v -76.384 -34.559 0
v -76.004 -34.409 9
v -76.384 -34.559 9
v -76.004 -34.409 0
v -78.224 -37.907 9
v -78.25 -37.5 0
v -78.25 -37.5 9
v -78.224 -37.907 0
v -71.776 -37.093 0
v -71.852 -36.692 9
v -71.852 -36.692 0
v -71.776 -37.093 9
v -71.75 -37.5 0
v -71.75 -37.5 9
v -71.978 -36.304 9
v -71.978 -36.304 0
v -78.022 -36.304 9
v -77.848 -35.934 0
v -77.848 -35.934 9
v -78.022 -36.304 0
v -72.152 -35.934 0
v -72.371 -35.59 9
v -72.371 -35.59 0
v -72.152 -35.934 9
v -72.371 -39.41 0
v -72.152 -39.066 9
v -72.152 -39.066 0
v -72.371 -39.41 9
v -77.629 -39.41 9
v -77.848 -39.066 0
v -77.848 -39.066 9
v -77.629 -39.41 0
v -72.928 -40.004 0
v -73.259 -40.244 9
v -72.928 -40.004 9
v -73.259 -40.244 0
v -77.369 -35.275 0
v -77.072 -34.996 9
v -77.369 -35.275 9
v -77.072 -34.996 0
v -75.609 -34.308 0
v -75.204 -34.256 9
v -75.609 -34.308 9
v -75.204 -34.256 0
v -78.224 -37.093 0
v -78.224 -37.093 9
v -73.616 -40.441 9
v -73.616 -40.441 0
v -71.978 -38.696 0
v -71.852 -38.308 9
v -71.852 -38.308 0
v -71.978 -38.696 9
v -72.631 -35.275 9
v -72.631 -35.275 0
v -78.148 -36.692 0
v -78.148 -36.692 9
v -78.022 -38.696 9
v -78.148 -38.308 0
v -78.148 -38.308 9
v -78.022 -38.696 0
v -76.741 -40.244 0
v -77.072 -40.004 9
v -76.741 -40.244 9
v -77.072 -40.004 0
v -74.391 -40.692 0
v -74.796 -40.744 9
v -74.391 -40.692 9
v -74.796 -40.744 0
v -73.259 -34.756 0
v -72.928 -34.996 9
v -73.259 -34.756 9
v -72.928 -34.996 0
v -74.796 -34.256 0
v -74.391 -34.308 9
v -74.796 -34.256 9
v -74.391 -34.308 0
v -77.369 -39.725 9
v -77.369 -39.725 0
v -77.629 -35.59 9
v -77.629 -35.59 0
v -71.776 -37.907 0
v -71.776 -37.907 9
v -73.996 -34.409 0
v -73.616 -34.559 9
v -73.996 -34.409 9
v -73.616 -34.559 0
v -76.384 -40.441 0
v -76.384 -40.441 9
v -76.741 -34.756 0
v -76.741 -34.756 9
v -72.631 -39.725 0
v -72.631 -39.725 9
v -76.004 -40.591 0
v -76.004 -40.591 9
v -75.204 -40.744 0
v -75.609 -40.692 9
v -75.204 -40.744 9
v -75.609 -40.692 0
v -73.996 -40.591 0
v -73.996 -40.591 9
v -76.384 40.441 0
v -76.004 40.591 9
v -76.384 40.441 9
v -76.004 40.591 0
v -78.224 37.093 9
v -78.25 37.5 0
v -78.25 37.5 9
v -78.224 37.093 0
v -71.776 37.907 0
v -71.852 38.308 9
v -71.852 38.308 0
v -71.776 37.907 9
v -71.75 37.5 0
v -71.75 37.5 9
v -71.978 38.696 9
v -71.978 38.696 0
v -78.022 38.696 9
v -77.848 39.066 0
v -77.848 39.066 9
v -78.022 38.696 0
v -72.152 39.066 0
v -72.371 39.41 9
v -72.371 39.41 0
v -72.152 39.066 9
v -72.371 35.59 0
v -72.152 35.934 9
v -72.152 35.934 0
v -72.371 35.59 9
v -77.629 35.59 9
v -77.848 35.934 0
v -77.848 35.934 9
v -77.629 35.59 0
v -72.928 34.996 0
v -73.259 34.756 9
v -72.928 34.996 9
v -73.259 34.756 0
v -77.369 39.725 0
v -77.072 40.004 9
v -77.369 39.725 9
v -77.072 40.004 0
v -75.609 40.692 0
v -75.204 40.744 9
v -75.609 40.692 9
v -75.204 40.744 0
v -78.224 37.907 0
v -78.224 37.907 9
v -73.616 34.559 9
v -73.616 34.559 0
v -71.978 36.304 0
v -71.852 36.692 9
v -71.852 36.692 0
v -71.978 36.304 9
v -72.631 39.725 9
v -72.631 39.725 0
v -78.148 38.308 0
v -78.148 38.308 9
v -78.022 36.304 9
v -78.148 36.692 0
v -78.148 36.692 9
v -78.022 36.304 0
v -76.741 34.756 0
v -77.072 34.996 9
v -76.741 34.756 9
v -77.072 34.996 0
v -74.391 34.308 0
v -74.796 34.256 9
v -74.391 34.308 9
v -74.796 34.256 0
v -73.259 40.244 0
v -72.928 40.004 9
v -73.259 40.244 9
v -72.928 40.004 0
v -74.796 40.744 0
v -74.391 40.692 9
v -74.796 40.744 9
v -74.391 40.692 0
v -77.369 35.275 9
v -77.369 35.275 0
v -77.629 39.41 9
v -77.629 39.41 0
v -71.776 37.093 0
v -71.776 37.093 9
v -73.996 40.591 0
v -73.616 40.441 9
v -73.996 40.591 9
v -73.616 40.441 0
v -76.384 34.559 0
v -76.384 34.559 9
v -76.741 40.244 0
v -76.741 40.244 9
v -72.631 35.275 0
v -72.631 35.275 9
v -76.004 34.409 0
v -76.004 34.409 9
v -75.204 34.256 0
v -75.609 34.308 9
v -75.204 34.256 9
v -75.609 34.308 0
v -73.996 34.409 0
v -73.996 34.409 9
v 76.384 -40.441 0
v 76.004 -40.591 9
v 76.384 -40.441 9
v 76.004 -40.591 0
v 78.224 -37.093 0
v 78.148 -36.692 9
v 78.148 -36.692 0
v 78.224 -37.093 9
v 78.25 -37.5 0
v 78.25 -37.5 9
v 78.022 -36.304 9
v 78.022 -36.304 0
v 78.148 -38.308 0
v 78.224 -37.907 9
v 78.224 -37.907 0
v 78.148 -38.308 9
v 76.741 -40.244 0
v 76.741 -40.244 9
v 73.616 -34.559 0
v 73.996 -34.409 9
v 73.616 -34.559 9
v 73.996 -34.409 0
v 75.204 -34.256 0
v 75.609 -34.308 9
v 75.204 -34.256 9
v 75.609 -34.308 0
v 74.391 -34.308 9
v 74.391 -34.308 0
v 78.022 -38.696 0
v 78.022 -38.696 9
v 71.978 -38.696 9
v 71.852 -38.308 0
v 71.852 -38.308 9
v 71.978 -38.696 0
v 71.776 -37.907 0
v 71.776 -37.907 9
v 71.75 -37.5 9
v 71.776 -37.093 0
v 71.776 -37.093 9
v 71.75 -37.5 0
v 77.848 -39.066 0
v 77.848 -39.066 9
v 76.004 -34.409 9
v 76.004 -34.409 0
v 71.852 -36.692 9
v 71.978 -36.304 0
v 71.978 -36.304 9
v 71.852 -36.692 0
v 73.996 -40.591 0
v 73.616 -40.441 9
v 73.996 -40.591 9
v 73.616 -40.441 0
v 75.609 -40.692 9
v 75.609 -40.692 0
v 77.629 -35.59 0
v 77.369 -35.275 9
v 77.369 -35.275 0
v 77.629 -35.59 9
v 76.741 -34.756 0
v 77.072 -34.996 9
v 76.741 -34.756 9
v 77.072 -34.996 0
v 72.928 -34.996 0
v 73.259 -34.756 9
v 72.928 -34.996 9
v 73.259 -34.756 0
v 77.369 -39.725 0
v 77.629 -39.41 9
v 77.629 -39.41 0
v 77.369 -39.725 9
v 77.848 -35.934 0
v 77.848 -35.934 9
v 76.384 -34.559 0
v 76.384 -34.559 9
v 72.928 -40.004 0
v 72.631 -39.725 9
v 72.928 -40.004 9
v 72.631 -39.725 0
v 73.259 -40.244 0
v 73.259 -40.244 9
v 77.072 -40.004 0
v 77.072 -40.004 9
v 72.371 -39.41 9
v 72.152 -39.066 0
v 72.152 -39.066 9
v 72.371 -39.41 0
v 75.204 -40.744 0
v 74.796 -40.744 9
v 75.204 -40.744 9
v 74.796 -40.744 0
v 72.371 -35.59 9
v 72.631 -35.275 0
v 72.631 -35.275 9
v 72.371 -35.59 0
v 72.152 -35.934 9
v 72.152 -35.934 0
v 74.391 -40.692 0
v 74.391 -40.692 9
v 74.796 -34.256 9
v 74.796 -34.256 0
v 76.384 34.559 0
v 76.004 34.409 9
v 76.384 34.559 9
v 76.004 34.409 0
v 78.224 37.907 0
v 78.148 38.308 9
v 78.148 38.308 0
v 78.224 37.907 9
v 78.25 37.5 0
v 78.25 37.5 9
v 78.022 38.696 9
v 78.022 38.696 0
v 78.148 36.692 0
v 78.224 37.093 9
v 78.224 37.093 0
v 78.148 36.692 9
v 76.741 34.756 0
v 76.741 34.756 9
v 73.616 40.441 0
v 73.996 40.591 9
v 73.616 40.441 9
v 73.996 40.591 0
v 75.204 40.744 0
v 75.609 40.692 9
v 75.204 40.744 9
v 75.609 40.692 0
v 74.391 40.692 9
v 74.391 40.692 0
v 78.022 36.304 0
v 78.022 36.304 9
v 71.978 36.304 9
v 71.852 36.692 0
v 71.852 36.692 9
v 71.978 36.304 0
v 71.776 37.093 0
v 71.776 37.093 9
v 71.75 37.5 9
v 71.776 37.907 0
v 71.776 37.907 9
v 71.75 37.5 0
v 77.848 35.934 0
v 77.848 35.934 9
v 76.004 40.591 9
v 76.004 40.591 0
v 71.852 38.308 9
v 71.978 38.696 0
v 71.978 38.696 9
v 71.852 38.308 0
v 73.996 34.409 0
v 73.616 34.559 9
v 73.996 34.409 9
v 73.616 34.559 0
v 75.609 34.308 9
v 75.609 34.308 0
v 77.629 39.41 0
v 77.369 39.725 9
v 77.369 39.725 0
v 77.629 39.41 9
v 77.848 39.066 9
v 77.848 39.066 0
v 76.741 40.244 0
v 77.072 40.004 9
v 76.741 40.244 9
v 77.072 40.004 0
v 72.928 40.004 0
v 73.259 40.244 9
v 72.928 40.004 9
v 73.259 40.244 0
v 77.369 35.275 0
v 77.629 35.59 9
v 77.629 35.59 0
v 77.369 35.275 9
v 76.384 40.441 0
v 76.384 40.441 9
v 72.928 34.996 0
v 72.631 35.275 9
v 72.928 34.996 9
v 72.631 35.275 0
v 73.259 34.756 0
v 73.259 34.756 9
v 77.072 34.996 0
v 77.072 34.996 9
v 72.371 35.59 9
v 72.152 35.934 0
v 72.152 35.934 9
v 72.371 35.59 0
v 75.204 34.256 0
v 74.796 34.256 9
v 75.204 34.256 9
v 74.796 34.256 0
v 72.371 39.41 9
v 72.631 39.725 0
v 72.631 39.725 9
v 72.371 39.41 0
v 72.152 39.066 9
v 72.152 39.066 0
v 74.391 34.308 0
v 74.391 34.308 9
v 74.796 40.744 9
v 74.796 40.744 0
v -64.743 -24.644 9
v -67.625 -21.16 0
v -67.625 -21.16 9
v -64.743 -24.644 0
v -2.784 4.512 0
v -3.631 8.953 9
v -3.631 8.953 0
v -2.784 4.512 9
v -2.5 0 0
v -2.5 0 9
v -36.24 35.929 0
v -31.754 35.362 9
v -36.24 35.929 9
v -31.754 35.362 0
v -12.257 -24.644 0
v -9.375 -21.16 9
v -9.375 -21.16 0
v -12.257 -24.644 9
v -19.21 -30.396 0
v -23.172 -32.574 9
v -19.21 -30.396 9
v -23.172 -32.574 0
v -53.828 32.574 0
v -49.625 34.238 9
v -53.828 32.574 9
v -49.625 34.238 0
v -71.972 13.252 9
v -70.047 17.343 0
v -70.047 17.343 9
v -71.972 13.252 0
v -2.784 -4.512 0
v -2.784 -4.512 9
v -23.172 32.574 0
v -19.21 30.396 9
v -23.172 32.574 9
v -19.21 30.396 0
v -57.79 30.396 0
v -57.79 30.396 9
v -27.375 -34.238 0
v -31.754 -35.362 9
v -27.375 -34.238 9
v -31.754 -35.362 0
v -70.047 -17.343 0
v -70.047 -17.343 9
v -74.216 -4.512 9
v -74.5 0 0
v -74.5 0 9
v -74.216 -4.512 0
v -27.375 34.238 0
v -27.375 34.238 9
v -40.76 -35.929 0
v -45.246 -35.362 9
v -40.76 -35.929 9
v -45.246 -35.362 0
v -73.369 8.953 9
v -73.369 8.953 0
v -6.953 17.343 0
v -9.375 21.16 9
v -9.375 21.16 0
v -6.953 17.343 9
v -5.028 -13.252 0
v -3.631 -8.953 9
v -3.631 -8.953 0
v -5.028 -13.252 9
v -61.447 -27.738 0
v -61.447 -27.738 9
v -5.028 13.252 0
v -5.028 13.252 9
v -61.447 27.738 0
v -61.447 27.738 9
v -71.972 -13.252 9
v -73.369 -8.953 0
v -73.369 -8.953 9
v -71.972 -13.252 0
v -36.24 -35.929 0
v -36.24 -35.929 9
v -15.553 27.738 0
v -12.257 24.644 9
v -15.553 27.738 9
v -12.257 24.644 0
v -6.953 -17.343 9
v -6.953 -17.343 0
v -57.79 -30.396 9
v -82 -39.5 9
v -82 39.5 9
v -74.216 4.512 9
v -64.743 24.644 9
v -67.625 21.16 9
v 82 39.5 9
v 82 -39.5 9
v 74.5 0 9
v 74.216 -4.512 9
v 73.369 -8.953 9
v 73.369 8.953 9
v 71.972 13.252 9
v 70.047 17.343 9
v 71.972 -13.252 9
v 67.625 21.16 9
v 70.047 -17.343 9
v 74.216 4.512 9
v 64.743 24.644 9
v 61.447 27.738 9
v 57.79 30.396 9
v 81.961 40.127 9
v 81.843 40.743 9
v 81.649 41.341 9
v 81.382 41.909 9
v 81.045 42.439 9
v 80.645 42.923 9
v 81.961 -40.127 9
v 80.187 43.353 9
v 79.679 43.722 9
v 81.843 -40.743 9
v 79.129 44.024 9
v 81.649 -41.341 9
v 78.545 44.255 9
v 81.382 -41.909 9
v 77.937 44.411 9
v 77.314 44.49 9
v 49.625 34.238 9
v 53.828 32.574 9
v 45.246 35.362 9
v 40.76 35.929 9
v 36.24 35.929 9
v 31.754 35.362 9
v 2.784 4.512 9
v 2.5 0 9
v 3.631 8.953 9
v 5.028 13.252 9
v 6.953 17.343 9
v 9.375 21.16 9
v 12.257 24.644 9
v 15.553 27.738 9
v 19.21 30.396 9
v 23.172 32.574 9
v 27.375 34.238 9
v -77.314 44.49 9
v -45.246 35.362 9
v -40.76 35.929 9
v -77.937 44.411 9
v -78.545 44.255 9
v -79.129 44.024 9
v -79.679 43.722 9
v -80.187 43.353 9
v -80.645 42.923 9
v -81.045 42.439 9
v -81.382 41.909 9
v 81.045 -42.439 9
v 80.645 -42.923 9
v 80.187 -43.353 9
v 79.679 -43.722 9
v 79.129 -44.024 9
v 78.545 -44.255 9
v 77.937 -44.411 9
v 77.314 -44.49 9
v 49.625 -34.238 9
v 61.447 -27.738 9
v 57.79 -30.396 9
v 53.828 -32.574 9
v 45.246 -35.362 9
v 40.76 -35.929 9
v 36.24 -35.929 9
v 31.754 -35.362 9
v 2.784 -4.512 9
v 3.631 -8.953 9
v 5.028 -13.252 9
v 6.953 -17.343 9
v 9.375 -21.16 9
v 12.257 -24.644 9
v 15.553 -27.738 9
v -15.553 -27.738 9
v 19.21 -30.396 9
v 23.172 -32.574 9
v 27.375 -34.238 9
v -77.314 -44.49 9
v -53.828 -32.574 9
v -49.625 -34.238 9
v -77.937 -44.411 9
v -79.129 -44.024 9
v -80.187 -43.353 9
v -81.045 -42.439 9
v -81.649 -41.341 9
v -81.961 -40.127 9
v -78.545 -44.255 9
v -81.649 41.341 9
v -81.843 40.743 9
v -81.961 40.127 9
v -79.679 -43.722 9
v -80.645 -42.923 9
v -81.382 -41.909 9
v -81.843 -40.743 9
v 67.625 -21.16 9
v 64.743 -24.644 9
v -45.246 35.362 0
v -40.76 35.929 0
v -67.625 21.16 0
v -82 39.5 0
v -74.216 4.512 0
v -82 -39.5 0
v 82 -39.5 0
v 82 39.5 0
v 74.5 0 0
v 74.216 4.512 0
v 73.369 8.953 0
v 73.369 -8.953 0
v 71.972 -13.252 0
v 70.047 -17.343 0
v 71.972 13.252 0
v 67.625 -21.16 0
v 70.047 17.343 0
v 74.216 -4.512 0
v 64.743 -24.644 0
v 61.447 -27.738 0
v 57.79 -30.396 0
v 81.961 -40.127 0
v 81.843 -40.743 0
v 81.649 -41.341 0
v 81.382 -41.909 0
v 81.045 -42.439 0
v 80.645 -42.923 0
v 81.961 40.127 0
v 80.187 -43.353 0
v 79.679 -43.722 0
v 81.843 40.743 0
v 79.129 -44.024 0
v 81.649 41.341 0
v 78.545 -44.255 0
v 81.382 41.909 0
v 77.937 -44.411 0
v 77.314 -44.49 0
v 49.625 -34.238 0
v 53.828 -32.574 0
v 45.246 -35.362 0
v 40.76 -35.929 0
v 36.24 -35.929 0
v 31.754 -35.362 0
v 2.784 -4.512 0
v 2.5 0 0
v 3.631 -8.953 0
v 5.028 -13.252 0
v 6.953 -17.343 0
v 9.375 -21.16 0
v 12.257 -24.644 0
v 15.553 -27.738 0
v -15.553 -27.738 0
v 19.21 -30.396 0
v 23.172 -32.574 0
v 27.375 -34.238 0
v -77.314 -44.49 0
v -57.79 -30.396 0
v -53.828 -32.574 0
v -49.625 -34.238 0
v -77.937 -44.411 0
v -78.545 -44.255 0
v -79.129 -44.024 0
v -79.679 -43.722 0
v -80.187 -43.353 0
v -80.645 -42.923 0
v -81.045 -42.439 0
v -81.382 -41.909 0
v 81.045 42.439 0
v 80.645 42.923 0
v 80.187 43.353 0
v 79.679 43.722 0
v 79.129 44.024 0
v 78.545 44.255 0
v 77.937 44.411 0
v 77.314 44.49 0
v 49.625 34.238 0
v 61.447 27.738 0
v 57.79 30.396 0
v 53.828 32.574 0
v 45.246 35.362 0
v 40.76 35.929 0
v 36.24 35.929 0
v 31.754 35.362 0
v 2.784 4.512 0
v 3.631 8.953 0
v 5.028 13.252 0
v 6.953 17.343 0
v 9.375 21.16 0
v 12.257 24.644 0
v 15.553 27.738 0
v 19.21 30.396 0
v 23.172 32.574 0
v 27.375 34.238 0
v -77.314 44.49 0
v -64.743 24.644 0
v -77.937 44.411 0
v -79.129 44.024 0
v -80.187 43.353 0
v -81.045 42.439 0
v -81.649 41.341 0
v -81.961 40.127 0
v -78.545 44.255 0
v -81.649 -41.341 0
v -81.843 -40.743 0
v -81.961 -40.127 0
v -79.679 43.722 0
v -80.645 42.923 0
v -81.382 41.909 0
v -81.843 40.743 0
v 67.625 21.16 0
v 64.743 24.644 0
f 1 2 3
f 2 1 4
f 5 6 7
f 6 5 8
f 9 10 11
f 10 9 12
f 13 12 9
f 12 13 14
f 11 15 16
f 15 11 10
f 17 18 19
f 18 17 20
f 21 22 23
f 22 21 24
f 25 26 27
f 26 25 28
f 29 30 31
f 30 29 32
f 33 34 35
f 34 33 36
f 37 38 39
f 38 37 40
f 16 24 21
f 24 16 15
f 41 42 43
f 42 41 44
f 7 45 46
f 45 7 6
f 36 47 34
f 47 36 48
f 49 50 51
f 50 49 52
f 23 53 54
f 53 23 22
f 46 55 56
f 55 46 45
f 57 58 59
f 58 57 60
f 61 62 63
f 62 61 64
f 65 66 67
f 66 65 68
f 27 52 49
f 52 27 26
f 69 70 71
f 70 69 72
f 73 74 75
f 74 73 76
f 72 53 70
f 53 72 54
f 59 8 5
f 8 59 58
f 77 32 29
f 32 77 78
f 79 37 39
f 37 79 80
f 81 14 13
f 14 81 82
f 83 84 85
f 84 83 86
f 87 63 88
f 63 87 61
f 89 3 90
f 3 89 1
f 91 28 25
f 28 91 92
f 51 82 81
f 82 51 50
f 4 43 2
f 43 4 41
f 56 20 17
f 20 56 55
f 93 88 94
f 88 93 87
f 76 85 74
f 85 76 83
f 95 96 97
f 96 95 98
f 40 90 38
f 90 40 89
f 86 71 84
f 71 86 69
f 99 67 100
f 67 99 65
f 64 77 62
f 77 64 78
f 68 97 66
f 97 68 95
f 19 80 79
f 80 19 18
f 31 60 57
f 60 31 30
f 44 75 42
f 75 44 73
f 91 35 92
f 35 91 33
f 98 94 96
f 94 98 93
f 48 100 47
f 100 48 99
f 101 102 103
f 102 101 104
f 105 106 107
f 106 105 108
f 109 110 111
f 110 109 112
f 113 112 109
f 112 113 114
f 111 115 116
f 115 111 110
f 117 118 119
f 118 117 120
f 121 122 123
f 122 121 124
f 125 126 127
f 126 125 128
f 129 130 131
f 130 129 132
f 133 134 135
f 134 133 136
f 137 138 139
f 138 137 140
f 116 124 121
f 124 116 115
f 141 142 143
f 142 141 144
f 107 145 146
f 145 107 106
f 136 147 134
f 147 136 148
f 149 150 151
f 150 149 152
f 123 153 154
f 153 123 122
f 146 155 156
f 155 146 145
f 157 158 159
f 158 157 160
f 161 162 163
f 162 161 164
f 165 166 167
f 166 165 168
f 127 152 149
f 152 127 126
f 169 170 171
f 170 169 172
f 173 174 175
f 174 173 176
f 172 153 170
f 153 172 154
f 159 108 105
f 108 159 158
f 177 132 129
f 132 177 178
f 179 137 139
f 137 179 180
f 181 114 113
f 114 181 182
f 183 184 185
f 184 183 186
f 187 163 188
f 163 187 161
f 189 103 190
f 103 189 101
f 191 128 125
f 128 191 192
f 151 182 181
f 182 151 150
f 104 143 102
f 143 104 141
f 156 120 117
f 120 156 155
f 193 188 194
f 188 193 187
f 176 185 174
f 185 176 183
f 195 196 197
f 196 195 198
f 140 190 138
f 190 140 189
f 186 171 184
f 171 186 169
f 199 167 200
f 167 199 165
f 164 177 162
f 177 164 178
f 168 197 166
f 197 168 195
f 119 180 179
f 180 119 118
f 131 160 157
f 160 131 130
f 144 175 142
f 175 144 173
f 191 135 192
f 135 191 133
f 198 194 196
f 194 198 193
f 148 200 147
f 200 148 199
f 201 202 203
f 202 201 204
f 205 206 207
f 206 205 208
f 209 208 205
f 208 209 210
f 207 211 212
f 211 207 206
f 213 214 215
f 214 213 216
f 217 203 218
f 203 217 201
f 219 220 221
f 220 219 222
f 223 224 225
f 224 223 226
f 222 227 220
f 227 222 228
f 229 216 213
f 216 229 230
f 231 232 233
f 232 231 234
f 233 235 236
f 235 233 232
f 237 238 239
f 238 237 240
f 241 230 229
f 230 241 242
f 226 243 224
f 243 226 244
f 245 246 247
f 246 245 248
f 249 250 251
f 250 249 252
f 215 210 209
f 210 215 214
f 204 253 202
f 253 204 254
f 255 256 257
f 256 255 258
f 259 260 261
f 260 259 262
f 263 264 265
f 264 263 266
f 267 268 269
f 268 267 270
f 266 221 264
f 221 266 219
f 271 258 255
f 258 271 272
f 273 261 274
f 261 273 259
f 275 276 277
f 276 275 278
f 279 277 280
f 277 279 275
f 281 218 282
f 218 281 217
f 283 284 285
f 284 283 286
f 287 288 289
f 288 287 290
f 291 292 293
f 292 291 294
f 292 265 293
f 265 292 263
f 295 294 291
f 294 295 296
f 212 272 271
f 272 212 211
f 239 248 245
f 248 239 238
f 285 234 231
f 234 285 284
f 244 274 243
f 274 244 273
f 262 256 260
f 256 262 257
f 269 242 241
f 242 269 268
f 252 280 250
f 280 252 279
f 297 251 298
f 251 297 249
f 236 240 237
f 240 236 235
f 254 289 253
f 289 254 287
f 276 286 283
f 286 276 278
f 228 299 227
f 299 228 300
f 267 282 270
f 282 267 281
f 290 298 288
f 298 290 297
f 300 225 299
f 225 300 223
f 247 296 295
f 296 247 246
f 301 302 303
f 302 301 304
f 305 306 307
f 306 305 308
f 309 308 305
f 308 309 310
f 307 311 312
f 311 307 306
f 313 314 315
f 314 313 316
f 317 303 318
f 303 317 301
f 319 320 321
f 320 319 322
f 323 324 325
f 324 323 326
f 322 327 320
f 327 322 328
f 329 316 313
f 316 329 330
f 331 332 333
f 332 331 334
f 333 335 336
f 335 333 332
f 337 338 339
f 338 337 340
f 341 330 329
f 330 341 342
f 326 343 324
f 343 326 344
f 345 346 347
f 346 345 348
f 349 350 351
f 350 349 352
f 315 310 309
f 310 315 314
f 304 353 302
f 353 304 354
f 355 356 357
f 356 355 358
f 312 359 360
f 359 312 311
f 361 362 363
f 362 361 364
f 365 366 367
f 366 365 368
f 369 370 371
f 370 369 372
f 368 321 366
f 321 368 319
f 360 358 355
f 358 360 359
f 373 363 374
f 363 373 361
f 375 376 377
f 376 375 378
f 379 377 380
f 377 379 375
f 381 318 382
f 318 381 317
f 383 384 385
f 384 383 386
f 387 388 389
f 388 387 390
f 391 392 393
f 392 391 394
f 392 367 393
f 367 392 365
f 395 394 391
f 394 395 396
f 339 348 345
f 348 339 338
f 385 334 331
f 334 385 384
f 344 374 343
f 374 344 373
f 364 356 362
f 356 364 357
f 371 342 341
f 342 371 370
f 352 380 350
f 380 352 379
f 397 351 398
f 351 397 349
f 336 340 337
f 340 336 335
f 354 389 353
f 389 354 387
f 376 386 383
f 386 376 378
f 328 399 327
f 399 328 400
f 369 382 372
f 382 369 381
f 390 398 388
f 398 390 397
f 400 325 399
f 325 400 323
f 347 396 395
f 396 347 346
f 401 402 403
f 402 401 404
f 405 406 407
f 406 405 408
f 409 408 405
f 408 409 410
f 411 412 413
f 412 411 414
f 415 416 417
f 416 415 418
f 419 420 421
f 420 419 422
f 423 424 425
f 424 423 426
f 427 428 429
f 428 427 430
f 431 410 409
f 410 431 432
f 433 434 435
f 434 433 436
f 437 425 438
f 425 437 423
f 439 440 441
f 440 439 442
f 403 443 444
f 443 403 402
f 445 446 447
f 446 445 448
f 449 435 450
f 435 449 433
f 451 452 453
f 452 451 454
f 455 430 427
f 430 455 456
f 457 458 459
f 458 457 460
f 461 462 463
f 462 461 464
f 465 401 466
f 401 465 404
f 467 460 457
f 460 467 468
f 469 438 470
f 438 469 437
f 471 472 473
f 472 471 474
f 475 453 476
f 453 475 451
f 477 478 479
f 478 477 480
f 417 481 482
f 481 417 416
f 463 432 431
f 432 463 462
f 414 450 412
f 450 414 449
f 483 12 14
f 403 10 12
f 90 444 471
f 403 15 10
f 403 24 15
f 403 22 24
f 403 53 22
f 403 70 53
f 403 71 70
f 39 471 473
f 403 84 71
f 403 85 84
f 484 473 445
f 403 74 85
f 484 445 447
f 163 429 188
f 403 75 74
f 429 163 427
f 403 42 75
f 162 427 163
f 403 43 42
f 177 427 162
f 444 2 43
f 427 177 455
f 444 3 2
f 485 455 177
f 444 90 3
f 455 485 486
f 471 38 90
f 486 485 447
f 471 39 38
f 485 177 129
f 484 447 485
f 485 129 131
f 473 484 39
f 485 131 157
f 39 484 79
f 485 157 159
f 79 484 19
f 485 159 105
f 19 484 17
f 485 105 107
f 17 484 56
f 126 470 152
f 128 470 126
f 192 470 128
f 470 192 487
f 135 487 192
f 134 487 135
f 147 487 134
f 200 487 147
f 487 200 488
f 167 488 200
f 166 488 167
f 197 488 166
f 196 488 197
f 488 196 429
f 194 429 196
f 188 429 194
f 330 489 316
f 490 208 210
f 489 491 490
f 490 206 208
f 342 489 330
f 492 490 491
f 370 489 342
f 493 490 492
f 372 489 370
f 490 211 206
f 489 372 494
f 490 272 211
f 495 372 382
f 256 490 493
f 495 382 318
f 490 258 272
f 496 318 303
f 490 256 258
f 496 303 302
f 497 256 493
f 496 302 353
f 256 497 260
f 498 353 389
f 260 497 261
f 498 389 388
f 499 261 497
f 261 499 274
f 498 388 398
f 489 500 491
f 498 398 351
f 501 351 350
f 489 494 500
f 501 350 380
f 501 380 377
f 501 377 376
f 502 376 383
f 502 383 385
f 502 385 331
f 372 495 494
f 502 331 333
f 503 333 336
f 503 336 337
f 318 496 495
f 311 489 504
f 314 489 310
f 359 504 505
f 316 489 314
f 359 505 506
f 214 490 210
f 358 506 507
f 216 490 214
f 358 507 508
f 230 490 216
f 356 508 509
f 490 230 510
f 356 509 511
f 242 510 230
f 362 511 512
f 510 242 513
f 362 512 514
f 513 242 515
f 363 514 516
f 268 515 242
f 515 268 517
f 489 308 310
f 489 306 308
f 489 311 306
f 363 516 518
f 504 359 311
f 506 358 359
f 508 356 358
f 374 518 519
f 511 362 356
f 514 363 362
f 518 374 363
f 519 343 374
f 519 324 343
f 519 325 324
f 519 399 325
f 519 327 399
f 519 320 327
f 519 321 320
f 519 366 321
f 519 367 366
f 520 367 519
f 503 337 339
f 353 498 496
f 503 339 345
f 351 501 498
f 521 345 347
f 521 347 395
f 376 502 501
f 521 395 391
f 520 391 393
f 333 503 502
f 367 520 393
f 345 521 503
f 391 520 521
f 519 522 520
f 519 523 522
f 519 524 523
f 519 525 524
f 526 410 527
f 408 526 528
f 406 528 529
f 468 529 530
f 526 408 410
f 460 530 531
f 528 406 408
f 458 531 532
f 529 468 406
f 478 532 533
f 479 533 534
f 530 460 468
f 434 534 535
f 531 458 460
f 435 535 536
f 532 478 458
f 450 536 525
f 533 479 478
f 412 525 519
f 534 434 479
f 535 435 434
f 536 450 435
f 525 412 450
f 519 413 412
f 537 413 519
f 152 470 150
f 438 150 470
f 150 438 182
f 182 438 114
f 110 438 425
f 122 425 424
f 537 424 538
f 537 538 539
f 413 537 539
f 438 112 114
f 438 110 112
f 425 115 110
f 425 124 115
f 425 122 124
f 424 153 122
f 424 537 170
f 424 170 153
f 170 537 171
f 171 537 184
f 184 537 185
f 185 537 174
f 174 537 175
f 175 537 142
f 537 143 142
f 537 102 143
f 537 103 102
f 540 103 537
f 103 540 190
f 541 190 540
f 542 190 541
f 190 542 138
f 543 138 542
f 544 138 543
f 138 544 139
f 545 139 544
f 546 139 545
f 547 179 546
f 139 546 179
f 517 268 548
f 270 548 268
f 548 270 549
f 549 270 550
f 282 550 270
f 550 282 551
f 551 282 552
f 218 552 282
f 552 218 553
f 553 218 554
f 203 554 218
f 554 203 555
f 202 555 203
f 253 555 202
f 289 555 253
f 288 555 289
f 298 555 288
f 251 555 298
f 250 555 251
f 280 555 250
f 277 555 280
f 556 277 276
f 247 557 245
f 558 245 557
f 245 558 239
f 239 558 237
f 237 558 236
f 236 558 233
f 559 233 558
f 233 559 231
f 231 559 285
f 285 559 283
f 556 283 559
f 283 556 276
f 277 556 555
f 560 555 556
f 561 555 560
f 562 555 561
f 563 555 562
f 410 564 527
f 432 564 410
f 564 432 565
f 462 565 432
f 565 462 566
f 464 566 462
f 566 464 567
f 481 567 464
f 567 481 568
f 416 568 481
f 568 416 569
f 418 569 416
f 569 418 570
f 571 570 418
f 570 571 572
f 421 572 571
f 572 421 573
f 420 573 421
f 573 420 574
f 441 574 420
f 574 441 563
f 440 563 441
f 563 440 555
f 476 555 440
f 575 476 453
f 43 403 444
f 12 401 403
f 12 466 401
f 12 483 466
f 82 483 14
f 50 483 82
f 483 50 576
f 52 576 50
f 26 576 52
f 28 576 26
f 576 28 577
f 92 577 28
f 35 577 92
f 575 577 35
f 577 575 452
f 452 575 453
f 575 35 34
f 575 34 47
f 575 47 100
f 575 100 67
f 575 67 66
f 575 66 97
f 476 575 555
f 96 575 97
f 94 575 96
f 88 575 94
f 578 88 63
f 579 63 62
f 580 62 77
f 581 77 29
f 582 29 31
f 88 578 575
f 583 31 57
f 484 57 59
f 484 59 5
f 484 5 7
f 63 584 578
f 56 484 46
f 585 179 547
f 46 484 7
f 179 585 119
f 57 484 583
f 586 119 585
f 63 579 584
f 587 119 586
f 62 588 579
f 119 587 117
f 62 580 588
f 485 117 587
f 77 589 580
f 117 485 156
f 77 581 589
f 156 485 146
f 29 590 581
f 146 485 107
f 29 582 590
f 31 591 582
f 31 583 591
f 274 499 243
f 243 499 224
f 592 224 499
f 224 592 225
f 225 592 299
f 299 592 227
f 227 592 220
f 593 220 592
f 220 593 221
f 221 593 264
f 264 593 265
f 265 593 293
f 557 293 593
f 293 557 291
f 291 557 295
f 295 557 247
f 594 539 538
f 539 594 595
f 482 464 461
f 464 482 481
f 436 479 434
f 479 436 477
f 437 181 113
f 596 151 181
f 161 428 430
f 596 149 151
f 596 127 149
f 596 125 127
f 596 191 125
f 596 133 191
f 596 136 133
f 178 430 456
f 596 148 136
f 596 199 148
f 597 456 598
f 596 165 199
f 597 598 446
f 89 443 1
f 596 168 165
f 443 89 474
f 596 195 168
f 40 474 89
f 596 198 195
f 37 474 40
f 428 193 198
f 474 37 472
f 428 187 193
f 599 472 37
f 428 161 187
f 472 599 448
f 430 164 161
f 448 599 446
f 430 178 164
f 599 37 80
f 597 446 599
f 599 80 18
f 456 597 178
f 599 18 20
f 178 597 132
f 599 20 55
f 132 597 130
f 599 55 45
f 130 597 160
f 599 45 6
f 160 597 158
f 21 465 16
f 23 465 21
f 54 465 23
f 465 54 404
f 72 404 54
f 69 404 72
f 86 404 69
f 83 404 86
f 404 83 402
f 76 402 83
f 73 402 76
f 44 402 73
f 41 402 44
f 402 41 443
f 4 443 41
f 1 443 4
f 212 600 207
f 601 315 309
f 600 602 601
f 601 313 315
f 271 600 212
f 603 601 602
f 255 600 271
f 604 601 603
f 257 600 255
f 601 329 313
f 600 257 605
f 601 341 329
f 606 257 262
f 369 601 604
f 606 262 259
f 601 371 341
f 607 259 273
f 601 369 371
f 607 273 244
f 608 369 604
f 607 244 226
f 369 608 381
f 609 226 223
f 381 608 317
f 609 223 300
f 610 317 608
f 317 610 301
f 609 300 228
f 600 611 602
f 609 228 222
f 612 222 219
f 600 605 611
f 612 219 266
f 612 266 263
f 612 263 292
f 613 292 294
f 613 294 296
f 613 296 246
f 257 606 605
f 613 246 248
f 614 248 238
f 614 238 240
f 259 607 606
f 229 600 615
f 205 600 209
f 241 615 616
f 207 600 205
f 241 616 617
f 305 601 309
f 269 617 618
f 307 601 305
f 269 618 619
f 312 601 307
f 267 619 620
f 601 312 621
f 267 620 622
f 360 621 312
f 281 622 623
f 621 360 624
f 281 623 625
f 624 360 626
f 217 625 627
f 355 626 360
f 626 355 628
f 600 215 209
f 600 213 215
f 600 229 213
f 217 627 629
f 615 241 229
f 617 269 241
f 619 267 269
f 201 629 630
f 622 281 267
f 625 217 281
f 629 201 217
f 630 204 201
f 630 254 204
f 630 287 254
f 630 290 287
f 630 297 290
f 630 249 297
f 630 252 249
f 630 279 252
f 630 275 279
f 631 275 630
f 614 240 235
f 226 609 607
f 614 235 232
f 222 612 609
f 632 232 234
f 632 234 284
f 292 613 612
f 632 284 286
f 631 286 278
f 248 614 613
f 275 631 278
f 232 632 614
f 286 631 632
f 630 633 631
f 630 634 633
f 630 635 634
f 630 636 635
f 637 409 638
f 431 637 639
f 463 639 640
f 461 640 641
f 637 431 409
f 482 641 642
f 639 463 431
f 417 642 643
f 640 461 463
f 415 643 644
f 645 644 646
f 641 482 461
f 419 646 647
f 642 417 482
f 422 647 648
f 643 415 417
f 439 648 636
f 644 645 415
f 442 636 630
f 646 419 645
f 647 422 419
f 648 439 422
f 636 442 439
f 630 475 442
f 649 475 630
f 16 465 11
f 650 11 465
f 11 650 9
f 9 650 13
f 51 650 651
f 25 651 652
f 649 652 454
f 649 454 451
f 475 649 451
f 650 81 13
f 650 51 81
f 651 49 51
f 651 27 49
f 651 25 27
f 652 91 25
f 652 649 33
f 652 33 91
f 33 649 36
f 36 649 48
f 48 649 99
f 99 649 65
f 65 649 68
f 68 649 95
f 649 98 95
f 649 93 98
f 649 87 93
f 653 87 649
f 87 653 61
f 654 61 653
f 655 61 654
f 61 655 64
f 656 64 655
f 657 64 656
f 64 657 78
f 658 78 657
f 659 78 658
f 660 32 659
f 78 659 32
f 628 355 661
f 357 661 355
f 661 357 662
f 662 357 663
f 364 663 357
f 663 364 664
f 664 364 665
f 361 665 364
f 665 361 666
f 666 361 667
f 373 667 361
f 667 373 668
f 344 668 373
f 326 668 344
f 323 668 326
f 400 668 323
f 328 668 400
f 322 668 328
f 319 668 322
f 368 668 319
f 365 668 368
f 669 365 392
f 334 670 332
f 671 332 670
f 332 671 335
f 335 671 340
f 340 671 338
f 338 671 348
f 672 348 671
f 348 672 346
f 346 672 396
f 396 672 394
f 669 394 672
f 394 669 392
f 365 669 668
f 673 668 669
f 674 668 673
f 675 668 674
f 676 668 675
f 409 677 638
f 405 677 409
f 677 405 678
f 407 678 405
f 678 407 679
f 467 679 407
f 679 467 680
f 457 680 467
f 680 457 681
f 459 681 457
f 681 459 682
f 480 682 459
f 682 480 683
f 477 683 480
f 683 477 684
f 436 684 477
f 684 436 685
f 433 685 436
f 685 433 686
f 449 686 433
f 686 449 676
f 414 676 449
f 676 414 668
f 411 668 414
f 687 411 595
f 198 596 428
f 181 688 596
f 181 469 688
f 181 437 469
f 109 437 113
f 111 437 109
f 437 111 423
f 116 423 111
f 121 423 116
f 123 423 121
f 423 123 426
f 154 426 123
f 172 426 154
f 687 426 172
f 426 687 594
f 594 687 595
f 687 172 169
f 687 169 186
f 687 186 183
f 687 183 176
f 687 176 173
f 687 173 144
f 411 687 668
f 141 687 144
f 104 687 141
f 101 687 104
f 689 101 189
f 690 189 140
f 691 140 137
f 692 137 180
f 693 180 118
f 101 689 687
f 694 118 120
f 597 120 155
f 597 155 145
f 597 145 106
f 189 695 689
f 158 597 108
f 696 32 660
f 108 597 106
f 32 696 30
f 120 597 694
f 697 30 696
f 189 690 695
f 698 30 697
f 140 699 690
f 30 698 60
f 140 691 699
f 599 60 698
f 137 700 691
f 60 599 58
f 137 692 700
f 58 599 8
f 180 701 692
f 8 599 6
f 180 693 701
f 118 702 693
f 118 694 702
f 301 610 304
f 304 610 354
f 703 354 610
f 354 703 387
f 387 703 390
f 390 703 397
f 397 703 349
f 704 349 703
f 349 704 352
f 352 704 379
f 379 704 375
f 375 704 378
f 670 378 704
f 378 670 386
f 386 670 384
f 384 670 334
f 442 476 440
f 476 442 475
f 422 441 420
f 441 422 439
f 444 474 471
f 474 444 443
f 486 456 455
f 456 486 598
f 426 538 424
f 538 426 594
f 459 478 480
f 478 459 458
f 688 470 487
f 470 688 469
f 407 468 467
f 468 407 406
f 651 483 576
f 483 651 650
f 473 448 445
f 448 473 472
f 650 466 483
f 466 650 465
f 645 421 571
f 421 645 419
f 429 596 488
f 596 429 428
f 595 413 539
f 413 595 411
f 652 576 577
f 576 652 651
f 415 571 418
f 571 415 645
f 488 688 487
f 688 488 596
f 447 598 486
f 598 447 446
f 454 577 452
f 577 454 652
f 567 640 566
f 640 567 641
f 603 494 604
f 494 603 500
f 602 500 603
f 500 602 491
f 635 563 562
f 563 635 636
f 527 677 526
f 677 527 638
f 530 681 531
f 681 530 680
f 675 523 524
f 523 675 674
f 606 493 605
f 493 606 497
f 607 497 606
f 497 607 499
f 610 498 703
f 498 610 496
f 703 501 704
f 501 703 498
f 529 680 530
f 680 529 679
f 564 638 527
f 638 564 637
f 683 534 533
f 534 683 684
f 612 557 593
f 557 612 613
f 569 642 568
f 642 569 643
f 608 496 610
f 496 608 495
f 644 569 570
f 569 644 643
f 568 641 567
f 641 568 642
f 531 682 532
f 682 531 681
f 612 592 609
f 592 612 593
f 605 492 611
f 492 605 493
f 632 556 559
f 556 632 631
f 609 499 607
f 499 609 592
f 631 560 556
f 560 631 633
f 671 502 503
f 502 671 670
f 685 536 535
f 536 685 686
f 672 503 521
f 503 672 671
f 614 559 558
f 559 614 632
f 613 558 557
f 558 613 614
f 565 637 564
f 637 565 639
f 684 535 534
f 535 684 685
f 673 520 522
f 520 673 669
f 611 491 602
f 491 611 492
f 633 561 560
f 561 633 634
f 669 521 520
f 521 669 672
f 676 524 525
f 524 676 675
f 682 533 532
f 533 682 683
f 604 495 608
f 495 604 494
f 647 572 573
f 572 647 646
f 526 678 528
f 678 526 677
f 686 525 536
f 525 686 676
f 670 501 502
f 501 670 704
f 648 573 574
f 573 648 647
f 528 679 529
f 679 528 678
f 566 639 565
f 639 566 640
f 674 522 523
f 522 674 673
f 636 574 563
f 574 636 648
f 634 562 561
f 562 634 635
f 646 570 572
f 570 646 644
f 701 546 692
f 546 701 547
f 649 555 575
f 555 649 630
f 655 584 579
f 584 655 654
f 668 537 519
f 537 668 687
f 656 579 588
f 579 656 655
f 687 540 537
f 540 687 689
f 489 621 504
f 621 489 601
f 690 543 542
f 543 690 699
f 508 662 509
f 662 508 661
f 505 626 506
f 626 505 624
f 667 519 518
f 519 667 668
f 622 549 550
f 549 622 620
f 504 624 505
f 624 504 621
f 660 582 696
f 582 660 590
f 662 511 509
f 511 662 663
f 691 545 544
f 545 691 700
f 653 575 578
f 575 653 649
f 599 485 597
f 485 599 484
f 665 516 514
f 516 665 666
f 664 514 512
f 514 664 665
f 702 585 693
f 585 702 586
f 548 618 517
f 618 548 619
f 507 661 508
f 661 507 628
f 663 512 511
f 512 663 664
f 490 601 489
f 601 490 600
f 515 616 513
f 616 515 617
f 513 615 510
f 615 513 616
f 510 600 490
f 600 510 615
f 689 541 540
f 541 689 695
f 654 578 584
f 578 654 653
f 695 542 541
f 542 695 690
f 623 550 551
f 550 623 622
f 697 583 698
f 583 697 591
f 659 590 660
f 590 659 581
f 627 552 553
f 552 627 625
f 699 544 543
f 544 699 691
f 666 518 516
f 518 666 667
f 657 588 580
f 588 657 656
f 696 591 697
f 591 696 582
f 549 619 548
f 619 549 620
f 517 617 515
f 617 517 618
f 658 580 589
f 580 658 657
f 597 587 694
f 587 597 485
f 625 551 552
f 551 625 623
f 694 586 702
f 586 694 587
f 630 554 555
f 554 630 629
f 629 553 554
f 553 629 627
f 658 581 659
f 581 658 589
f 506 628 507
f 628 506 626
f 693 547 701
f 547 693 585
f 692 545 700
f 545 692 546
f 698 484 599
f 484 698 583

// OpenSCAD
$fn = 50;

difference() {
	union() {
		hull() {
			translate(v = [-77.0, 39.5, 0]) {
				cylinder(h = 9, r = 5);
			}
			translate(v = [77.0, 39.5, 0]) {
				cylinder(h = 9, r = 5);
			}
			translate(v = [-77.0, -39.5, 0]) {
				cylinder(h = 9, r = 5);
			}
			translate(v = [77.0, -39.5, 0]) {
				cylinder(h = 9, r = 5);
			}
		}
	}
	union() {
		translate(v = [-75.0, -37.5, -100.0]) {
			cylinder(h = 200, r = 3.25);
		}
		translate(v = [-75.0, 37.5, -100.0]) {
			cylinder(h = 200, r = 3.25);
		}
		translate(v = [75.0, -37.5, -100.0]) {
			cylinder(h = 200, r = 3.25);
		}
		translate(v = [75.0, 37.5, -100.0]) {
			cylinder(h = 200, r = 3.25);
		}
		translate(v = [-75.0, -37.5, -100.0]) {
			cylinder(h = 200, r = 1.8);
		}
		translate(v = [-75.0, 37.5, -100.0]) {
			cylinder(h = 200, r = 1.8);
		}
		translate(v = [75.0, -37.5, -100.0]) {
			cylinder(h = 200, r = 1.8);
		}
		translate(v = [75.0, 37.5, -100.0]) {
			cylinder(h = 200, r = 1.8);
		}
		translate(v = [-38.5, 0, 0.0]) {
			cylinder(h = 9, r = 36.0);
		}
		translate(v = [38.5, 0, 0.0]) {
			cylinder(h = 9, r = 36.0);
		}
	}
}
